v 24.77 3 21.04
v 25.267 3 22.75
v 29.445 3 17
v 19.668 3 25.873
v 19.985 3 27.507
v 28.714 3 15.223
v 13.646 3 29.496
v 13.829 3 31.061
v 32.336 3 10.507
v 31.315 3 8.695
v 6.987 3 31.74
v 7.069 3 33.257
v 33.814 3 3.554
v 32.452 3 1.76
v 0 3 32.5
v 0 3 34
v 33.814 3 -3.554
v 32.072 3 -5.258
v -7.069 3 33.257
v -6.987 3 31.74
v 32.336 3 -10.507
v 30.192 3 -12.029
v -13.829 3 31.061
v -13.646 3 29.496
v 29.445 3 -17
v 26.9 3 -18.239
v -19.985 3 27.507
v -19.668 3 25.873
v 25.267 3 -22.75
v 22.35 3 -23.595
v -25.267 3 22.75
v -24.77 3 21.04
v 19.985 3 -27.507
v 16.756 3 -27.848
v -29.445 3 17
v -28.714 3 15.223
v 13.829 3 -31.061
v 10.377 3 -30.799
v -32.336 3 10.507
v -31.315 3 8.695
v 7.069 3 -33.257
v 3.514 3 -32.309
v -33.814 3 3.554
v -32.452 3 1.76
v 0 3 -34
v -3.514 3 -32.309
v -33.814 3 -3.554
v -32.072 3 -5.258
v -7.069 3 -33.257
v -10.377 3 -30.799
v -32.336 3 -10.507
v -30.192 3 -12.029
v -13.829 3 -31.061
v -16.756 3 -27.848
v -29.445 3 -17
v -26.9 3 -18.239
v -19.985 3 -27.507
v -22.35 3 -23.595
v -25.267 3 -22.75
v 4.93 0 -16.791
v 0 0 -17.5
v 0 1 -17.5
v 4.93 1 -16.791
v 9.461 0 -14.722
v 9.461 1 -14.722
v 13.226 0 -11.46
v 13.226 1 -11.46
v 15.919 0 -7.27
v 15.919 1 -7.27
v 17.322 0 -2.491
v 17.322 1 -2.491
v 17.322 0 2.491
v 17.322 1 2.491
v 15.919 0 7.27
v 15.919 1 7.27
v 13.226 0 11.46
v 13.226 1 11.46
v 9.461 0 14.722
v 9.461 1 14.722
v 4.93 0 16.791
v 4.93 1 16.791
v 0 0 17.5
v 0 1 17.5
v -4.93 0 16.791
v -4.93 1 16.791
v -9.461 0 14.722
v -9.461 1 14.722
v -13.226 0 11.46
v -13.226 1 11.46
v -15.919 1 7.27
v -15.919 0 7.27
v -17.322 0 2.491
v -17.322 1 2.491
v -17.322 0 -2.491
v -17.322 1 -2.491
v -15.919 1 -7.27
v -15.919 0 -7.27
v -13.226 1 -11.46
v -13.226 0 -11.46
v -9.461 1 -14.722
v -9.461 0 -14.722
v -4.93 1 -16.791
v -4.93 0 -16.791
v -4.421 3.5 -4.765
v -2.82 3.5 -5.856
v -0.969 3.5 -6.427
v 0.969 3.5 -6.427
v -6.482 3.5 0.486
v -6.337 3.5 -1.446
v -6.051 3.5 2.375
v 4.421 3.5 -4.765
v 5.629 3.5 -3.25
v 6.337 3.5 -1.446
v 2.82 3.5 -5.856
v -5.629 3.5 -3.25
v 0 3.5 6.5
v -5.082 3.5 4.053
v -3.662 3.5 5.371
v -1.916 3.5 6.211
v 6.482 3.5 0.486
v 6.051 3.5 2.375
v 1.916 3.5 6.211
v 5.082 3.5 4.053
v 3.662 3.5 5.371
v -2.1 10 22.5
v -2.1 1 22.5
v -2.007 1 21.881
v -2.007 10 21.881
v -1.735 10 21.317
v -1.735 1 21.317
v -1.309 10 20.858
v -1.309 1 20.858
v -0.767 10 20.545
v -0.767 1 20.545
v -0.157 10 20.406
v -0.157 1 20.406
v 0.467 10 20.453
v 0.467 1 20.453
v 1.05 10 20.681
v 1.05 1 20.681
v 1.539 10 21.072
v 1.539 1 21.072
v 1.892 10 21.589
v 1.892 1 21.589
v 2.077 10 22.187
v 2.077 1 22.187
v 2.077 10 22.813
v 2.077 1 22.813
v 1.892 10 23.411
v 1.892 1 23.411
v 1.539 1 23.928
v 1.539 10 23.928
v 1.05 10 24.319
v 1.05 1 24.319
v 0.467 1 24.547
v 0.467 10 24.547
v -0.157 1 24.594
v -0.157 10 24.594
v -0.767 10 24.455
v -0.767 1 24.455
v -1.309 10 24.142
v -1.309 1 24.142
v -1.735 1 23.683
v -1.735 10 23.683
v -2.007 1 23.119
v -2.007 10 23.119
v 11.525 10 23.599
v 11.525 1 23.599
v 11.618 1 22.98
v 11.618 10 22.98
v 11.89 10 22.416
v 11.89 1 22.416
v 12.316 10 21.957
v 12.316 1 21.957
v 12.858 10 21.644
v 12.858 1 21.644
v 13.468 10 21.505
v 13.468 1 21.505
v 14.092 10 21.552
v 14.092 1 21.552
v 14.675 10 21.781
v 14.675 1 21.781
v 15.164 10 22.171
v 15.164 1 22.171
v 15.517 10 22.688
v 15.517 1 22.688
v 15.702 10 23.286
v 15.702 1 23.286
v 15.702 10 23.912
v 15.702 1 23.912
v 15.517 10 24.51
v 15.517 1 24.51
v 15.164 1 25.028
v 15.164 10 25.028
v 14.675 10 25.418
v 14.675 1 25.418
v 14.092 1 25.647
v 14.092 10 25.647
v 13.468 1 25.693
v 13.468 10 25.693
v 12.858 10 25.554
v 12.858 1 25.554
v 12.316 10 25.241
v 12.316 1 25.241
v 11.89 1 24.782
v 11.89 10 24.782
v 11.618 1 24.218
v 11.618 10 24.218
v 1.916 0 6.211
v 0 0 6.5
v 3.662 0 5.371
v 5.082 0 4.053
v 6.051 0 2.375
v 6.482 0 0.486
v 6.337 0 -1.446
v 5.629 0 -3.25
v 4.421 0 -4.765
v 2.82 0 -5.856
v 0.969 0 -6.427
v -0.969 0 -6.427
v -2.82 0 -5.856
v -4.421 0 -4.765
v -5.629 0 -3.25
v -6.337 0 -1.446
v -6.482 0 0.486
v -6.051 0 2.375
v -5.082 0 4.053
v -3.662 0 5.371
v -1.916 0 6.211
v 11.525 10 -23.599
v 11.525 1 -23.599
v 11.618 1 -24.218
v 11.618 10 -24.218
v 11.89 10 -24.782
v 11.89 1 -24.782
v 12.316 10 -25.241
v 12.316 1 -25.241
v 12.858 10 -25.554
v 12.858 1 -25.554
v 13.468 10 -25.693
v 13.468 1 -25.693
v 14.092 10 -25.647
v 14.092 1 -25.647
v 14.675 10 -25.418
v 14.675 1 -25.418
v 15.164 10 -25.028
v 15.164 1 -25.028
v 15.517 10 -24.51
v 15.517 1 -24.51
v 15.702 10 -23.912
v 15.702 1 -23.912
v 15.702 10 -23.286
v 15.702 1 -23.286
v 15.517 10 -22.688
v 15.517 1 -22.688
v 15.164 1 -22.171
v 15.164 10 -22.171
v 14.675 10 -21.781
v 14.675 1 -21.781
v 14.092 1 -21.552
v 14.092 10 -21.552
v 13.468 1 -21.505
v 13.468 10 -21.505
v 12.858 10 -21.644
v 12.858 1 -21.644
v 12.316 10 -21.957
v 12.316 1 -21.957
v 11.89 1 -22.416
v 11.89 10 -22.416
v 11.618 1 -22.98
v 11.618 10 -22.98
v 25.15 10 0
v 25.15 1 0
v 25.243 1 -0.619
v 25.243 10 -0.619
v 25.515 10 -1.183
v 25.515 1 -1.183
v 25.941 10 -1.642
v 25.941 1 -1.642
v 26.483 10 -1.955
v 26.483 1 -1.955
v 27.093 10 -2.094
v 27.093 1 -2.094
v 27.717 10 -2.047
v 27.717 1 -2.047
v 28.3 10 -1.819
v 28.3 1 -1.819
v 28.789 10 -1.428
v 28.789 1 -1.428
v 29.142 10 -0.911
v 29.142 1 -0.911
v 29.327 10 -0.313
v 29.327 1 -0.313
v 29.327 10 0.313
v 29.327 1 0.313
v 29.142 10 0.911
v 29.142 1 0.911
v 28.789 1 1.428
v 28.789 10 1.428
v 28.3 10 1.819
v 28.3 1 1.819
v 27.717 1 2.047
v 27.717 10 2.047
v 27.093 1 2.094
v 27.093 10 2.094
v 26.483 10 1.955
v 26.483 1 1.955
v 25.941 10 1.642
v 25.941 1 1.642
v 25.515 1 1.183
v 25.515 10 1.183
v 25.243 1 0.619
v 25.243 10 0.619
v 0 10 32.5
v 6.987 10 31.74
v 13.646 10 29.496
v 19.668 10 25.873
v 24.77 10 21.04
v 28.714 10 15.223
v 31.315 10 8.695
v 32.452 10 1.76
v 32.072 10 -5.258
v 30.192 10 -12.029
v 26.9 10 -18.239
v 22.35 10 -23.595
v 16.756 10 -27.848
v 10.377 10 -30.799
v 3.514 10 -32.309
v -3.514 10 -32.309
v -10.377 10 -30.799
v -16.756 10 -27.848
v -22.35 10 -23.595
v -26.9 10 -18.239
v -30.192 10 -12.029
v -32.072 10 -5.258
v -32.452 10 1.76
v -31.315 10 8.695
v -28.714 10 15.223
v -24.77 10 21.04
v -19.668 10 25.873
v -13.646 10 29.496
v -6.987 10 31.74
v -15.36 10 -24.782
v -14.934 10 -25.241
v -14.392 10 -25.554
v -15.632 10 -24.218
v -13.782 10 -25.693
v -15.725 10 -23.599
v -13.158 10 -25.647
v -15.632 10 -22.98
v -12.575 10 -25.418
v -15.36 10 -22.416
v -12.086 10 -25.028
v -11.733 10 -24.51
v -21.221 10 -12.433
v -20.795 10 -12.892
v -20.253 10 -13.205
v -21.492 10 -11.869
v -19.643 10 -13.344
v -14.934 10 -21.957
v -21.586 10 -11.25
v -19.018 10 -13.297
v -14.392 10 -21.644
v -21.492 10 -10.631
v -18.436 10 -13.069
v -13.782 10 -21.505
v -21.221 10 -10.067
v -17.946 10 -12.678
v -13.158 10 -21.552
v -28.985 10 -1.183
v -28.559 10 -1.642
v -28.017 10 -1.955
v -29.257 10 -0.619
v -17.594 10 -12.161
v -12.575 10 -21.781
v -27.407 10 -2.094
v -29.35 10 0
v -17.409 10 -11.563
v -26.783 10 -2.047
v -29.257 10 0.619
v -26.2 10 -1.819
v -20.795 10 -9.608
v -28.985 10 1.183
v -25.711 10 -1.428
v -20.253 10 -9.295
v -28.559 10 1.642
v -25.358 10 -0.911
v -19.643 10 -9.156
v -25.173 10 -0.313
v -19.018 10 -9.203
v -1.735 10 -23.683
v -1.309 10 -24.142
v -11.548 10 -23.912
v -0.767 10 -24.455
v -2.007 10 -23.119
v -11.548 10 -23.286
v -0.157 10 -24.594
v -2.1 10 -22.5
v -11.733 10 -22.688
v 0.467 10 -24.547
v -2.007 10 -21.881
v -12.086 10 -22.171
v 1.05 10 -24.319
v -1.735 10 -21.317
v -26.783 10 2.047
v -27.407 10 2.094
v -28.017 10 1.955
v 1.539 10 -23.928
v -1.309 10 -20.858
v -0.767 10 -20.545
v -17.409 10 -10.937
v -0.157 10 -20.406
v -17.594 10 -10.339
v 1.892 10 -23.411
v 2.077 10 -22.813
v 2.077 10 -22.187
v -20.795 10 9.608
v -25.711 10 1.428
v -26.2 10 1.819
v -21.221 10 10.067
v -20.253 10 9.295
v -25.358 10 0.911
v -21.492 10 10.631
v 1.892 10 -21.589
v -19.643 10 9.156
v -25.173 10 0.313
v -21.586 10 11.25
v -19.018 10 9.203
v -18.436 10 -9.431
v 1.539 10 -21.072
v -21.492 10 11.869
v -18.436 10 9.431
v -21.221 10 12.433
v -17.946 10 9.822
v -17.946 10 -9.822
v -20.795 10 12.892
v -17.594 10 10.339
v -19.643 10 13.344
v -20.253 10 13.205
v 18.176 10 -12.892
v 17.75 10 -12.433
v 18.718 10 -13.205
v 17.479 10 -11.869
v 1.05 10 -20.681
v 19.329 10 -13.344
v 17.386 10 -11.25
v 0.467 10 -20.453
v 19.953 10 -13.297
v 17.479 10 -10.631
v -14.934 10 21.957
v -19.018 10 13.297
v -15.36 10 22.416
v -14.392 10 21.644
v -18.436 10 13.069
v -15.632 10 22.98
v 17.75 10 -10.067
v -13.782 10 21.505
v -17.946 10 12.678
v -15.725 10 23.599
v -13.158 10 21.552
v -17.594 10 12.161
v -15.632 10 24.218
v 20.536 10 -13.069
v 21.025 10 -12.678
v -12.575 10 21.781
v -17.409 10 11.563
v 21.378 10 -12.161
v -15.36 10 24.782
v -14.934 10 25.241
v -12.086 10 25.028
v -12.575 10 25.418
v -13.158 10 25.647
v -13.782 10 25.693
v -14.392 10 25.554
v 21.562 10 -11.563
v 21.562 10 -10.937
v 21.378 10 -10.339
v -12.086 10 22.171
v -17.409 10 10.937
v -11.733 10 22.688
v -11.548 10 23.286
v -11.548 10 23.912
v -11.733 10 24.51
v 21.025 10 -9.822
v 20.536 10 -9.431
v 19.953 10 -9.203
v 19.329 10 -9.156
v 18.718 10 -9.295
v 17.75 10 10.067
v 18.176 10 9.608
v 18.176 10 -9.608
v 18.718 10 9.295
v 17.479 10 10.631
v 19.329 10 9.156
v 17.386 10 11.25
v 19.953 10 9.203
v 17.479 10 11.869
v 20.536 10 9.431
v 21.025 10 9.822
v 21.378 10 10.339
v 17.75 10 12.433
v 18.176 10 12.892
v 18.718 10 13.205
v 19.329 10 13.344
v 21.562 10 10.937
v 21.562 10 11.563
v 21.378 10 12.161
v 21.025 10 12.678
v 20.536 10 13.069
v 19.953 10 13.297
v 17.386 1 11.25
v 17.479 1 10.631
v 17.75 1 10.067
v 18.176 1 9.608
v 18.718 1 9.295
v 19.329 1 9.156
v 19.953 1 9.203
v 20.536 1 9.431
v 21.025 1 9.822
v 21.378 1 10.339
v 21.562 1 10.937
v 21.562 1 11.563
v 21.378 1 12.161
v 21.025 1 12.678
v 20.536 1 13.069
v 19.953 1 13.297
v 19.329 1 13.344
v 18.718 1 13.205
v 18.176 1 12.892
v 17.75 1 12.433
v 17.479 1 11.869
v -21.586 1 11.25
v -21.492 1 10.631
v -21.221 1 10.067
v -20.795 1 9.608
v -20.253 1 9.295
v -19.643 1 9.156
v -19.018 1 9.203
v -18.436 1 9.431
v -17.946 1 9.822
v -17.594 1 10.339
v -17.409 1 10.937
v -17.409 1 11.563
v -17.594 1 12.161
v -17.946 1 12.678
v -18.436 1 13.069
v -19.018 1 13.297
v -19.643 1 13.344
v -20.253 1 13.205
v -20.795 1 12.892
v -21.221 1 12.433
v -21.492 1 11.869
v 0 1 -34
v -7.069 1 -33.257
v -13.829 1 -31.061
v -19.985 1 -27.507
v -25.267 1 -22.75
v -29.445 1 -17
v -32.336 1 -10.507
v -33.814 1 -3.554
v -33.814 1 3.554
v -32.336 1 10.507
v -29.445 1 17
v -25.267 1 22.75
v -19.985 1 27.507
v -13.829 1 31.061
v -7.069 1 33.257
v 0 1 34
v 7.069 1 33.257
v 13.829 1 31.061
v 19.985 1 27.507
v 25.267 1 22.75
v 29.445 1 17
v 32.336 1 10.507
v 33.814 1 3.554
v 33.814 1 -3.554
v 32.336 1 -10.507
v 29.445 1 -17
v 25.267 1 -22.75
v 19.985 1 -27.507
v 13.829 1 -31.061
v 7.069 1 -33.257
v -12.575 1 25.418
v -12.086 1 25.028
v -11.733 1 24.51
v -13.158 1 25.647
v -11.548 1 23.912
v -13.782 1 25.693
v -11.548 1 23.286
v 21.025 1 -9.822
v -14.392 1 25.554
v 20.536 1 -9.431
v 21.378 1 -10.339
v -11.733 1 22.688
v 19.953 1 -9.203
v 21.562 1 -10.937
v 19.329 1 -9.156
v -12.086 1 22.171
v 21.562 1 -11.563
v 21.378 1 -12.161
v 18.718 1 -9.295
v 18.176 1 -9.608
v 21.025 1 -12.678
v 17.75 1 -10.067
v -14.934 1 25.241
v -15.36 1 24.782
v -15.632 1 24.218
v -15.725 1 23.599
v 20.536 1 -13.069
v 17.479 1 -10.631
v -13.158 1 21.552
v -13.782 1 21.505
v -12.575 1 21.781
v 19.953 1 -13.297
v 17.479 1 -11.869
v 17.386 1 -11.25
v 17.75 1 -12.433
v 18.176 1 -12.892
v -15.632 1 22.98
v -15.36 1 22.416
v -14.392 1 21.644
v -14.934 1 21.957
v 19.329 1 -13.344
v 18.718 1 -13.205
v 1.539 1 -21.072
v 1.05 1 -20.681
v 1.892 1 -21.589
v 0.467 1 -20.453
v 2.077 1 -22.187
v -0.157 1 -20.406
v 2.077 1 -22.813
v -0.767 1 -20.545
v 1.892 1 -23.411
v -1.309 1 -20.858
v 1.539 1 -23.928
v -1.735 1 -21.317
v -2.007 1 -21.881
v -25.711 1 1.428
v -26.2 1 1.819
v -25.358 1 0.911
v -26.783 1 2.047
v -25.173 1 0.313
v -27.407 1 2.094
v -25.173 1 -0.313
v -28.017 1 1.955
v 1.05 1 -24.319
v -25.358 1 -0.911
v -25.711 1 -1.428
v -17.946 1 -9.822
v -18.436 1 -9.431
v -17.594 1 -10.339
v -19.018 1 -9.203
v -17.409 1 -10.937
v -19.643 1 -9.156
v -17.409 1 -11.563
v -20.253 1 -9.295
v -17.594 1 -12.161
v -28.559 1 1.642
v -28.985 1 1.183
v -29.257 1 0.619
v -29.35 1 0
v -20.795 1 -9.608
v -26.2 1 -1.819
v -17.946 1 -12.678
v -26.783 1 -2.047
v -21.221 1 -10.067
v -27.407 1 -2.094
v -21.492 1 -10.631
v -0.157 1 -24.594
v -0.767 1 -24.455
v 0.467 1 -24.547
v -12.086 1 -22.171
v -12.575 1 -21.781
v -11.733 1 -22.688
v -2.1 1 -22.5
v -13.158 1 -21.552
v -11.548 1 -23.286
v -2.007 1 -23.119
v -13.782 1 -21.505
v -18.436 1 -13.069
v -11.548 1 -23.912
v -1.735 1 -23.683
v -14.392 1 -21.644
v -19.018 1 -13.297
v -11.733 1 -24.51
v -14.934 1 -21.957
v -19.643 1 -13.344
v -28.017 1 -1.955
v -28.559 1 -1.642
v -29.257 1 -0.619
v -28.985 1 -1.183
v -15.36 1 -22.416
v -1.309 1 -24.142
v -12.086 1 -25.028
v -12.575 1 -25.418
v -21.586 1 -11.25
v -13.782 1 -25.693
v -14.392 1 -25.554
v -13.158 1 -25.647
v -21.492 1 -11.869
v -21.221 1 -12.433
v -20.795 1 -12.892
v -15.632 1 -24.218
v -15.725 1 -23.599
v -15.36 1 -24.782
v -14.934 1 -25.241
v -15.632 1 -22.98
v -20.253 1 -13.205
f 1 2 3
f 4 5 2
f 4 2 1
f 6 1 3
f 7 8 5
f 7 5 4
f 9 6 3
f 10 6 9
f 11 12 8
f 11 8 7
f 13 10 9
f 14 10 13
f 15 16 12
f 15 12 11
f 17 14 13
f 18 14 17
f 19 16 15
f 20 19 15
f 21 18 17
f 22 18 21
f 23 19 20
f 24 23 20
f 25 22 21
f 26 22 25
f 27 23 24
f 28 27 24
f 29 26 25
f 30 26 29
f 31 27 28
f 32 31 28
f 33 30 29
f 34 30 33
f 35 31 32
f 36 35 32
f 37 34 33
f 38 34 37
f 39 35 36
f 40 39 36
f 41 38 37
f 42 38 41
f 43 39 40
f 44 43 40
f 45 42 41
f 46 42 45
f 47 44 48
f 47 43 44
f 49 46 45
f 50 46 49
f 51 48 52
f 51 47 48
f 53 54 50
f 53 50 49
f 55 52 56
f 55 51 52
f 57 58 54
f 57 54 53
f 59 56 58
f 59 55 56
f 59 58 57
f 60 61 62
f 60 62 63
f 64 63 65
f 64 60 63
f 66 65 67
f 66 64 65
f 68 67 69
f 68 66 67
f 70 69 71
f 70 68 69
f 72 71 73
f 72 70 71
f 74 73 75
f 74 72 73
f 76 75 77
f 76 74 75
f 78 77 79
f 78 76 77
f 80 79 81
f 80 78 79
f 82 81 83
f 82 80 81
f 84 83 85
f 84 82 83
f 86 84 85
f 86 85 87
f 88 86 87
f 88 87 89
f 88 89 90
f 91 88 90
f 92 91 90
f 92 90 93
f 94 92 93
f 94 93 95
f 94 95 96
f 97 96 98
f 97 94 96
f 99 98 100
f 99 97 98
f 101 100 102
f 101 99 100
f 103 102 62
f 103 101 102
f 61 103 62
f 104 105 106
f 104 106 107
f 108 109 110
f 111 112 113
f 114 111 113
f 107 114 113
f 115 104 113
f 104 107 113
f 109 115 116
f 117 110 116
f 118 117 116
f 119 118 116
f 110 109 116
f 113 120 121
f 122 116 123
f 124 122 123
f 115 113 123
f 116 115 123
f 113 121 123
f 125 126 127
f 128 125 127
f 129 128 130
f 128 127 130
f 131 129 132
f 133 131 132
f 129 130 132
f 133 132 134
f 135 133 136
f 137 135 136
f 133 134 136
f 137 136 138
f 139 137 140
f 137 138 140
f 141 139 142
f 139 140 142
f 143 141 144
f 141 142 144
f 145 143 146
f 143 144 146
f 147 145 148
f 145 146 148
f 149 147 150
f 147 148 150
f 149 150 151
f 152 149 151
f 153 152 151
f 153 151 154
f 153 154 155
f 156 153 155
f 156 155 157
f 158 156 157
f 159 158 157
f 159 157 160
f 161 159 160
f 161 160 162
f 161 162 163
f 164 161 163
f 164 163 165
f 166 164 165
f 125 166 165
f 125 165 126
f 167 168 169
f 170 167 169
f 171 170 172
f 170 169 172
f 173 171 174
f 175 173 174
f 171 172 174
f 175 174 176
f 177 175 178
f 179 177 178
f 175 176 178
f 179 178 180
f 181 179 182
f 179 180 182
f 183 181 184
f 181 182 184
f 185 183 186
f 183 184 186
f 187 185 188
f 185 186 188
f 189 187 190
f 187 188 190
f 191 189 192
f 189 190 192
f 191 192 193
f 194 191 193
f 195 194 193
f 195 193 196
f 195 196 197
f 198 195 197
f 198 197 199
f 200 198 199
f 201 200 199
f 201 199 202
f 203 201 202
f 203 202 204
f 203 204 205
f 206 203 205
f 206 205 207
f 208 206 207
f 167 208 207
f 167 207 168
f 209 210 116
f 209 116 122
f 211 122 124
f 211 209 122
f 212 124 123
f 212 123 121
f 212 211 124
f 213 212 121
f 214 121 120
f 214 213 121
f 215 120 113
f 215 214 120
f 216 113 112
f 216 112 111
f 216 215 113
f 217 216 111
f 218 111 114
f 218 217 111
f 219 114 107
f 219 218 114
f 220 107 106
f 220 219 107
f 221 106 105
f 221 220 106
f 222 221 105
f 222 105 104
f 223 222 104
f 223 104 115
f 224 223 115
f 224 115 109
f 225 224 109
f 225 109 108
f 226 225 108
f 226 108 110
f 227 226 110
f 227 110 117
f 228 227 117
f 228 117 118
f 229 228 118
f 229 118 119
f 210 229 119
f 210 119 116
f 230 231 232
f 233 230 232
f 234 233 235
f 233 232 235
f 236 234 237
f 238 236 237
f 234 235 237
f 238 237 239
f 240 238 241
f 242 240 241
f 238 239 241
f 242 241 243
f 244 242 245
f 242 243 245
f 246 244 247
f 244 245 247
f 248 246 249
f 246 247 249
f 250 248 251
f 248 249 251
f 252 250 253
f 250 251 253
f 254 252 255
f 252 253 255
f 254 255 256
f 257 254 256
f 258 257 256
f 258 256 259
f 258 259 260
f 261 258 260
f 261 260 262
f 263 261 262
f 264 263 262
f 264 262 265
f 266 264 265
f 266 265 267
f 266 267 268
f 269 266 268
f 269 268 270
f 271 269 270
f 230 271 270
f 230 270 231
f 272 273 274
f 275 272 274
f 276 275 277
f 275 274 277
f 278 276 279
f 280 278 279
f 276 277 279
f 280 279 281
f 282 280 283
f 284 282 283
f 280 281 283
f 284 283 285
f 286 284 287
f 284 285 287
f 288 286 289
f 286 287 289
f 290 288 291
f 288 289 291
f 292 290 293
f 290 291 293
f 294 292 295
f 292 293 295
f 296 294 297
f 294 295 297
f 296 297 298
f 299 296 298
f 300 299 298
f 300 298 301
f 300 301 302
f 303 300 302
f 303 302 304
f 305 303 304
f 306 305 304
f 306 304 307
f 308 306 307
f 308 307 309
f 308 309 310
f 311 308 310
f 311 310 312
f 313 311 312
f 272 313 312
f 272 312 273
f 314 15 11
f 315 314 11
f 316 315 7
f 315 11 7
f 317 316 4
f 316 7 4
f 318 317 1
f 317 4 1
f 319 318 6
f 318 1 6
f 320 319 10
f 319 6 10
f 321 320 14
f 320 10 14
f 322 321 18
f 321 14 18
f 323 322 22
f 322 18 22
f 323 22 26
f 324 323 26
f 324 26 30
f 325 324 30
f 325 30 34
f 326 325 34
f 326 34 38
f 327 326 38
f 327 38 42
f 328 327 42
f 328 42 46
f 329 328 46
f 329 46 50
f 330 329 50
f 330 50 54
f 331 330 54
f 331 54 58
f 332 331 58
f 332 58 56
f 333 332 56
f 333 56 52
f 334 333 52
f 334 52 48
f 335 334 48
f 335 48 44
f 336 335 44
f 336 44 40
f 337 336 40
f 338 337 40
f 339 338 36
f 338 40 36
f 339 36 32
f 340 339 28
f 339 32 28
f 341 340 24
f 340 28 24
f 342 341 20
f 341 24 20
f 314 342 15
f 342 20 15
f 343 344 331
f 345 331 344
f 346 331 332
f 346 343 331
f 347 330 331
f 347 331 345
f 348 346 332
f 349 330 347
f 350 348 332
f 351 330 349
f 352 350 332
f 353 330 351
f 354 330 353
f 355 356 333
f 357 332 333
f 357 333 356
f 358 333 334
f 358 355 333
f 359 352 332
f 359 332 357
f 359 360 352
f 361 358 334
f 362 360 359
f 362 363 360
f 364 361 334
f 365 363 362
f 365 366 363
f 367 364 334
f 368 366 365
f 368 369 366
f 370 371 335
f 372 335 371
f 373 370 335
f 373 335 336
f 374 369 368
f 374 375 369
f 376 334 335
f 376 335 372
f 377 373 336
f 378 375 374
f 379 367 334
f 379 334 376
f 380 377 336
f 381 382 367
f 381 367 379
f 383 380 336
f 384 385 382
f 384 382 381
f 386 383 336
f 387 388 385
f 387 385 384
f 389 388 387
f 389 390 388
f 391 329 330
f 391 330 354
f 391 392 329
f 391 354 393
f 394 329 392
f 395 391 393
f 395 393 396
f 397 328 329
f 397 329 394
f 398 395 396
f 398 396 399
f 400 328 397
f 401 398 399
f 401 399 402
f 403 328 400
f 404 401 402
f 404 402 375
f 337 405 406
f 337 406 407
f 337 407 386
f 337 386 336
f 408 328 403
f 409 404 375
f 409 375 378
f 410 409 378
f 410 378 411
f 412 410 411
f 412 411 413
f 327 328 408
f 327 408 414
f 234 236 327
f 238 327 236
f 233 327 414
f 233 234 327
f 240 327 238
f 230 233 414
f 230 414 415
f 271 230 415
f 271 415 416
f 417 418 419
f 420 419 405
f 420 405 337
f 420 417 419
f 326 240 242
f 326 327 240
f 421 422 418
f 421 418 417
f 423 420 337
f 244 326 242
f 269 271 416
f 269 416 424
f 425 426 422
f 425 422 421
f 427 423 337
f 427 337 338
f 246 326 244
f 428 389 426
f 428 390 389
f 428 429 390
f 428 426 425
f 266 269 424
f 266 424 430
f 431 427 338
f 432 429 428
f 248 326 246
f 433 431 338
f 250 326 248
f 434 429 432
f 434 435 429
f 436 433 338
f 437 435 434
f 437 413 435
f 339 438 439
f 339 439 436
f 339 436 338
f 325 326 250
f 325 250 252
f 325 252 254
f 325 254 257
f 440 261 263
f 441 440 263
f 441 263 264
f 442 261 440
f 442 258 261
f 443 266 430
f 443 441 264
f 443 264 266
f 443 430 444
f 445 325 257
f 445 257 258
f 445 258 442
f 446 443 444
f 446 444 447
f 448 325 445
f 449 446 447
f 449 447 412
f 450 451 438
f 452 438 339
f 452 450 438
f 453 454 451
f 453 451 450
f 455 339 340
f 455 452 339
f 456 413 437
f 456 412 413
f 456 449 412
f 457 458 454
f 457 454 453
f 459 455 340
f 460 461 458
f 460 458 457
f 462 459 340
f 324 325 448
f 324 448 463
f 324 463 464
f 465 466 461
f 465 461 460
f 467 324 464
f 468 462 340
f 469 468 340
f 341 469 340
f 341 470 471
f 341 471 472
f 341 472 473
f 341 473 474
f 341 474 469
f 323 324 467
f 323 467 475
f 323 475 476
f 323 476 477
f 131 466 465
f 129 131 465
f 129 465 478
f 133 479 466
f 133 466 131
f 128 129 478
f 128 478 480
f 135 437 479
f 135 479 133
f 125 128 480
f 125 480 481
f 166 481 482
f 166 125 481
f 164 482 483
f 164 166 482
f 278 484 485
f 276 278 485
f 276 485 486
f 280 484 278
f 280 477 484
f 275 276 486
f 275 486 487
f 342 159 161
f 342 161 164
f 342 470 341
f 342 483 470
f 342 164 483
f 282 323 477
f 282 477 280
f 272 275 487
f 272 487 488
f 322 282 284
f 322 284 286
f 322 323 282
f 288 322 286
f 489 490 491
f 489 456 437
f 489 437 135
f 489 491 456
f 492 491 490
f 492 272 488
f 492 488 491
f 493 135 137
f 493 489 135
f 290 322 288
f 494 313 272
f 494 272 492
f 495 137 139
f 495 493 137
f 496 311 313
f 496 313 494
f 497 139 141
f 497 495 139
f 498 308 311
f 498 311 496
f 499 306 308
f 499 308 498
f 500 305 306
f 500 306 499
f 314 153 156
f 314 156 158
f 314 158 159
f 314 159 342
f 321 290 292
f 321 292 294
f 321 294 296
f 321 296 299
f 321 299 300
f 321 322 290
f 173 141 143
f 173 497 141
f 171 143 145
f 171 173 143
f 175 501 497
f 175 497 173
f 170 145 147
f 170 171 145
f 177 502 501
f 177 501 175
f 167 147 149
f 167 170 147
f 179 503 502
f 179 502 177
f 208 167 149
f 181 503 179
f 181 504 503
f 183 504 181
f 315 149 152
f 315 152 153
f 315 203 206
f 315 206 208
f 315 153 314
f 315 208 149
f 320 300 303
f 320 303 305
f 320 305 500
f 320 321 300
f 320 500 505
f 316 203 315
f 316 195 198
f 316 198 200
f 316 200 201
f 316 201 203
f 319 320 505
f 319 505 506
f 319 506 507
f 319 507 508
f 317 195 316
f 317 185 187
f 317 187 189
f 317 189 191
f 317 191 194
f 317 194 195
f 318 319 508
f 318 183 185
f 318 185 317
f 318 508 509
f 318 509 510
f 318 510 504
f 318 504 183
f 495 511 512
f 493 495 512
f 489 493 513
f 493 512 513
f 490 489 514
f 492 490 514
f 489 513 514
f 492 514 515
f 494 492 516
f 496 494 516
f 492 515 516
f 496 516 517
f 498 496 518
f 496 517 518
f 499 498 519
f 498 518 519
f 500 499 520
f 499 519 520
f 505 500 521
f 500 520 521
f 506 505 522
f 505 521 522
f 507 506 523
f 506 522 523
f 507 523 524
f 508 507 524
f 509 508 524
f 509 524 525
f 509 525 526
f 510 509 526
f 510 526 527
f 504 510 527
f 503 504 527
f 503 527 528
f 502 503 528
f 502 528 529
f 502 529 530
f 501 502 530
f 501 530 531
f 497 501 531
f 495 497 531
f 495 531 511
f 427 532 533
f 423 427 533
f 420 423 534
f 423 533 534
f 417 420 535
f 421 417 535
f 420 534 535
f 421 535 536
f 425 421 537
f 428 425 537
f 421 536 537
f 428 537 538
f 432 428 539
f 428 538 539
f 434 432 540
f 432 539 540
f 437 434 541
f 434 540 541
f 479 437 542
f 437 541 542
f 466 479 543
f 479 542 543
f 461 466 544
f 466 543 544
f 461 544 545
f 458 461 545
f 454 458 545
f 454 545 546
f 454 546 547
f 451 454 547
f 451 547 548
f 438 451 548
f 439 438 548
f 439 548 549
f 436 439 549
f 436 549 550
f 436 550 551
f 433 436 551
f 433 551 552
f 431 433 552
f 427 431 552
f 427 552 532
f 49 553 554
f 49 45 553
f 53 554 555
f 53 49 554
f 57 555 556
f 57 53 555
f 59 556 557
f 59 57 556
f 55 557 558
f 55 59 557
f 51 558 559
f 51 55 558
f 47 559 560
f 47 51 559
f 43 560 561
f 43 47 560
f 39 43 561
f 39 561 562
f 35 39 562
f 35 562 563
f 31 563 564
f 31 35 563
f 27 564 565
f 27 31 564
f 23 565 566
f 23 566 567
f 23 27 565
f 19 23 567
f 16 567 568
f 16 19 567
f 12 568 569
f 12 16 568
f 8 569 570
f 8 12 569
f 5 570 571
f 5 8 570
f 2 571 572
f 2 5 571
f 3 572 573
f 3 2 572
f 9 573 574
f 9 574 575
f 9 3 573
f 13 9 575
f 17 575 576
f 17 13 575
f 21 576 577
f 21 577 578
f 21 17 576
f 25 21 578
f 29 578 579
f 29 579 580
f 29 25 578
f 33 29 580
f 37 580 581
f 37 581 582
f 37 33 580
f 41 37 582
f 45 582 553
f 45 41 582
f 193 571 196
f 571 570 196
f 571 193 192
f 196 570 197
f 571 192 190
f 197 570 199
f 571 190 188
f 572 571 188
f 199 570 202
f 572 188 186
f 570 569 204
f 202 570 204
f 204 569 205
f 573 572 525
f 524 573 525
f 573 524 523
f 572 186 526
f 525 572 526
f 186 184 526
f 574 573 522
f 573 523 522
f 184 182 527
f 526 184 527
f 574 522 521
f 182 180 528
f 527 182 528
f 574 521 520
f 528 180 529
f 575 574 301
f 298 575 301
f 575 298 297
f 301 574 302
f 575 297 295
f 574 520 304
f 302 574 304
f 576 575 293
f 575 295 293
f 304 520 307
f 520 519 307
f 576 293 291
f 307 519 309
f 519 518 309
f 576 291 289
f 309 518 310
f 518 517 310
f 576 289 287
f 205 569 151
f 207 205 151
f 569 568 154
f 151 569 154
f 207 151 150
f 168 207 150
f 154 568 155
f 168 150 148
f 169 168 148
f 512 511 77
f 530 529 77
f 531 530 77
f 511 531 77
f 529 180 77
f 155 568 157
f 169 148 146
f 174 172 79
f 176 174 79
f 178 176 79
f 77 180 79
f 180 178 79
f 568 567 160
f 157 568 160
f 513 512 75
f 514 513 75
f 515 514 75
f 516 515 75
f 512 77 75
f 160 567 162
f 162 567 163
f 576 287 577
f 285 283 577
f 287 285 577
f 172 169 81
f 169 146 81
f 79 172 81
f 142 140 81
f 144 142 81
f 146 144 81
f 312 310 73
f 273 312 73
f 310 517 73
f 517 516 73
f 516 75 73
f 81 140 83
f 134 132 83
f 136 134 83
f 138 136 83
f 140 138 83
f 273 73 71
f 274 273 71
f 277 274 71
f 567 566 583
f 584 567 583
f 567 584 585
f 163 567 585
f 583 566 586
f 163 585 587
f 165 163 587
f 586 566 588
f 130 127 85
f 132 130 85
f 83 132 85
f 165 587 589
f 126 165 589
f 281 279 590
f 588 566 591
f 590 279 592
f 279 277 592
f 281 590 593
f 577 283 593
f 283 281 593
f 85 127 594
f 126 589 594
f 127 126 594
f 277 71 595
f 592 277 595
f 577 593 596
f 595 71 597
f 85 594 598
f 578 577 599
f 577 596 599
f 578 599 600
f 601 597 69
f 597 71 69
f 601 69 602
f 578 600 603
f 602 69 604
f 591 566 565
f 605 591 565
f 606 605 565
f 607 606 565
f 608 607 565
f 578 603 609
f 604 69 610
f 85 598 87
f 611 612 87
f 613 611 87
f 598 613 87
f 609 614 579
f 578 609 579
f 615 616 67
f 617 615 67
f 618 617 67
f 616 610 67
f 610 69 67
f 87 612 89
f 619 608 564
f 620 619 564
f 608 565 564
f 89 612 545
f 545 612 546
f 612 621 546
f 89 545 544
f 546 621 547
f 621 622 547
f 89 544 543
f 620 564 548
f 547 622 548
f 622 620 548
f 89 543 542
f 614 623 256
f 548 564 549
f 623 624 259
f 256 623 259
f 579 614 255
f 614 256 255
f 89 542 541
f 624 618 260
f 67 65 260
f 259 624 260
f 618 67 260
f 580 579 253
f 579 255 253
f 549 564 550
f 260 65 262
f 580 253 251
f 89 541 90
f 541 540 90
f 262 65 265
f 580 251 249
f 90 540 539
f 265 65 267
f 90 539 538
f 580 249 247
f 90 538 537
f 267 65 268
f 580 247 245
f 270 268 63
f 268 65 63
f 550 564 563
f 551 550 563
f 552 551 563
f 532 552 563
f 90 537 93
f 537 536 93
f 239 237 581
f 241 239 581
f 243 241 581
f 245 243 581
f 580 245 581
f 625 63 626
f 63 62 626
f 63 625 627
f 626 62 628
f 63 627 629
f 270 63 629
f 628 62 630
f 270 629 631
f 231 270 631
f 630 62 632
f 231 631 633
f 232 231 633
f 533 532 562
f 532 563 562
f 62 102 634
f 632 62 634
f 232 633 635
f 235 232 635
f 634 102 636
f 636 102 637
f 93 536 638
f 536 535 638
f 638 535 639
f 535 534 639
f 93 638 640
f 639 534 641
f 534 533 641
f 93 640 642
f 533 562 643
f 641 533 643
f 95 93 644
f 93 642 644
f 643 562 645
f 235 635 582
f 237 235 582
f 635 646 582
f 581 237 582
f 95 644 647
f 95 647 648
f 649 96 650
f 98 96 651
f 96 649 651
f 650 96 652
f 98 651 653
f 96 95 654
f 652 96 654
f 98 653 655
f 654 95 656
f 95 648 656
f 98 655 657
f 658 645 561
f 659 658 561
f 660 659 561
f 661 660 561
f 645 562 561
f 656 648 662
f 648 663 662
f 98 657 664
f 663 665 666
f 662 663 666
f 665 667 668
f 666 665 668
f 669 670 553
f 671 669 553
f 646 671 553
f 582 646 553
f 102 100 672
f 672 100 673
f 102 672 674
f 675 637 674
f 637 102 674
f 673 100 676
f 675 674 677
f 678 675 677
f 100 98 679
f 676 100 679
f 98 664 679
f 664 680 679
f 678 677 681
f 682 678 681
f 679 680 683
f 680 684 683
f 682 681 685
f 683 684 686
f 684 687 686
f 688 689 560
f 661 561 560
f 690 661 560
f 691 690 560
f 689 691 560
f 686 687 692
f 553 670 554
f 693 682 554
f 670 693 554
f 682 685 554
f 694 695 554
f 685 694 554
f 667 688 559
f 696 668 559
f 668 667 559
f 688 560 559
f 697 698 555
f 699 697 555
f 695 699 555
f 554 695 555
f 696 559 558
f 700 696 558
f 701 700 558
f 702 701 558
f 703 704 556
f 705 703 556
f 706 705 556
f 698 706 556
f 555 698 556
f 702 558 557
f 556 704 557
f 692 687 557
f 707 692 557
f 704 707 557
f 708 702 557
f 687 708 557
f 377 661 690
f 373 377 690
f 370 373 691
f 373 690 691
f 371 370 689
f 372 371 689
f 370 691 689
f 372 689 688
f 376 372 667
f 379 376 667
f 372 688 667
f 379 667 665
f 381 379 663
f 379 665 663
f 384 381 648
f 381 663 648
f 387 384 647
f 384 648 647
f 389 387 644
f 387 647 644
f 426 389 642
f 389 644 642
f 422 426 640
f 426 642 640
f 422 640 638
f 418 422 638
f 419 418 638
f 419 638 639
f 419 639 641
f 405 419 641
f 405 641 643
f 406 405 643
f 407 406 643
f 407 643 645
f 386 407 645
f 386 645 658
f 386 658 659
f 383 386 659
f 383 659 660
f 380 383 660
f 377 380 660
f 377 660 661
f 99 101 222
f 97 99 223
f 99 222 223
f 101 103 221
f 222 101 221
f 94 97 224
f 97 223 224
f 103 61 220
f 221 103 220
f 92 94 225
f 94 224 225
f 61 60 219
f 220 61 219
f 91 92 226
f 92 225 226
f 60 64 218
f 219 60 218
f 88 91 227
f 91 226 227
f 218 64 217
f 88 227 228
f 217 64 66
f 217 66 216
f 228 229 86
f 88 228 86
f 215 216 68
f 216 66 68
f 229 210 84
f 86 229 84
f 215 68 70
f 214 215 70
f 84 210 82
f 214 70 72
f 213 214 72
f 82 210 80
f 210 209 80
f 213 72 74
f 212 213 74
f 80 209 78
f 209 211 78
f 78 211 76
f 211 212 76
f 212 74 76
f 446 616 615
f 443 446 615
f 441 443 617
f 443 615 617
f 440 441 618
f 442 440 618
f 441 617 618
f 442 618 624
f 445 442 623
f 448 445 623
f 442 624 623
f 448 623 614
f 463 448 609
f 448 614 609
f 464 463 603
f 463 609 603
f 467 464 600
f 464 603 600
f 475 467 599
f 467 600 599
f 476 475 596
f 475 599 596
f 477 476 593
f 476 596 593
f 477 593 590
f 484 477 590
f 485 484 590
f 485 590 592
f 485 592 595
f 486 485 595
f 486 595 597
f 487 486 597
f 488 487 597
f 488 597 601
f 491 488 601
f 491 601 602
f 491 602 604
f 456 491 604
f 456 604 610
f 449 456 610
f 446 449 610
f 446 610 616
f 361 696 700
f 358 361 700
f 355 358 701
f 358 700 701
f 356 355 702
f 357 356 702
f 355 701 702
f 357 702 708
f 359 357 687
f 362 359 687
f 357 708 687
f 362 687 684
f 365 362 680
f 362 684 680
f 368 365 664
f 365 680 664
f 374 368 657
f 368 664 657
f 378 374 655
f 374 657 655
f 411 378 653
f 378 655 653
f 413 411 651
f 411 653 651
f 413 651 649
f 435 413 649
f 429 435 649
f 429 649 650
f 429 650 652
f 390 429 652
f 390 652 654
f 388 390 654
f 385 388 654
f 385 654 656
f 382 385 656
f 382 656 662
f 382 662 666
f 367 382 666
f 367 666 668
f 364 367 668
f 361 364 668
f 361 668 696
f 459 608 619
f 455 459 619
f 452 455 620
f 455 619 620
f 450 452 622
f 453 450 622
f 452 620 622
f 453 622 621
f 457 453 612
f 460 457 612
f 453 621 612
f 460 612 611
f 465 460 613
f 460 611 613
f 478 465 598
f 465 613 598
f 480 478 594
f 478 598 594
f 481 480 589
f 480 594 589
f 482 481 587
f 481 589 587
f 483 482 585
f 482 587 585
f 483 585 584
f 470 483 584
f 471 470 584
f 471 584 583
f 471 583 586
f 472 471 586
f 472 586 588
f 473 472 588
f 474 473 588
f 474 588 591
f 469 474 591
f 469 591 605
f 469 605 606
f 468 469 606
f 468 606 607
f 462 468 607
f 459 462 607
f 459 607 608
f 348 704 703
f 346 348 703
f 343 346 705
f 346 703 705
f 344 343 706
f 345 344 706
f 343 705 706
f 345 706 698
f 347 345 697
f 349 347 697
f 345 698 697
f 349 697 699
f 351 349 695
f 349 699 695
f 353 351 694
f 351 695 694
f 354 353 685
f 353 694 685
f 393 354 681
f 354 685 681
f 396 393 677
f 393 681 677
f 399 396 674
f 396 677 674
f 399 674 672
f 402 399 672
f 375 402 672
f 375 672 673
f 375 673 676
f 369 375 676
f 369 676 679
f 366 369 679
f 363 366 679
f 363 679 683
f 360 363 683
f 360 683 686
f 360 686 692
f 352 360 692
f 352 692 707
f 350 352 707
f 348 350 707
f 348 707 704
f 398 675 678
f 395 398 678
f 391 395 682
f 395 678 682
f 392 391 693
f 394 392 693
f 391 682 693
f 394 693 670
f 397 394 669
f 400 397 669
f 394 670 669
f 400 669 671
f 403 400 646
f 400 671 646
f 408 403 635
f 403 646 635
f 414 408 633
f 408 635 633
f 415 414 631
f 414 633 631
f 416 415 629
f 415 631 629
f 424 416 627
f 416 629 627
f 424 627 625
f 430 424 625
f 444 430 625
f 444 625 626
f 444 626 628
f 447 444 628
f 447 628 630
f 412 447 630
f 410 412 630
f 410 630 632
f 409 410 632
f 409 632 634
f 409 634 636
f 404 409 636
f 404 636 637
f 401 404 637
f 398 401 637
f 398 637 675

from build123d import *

# Parameters (mm, degrees)
SKETCH2_R             = 32.5
SKETCH2_R_2           = 6.5
SKETCH2_R_3           = 1.5
BOSS_EXTRUDE1_DEPTH   = 10
M5X0_8_TAPPED_HOLE1_D = 4.2
BOSS_EXTRUDE2_START   = -6.5
SKETCH8_R             = 6.5
BOSS_EXTRUDE2_DEPTH   = 6.5
SKETCH9_R             = 32.5
SKETCH9_R_2           = 17.5
CUT_EXTRUDE1_DEPTH    = 1
SKETCH10_W            = 1.5
SKETCH10_H            = 2
M5X0_8_TAPPED_HOLE2_D = 4.2


with BuildPart() as part:
    # Sketch2 → Boss-Extrude1 (new body)
    with BuildSketch(Plane(origin=(0, 0, 0), x_dir=(1, 0, 0), z_dir=(0, 1, 0))):
        with Locations(Location((0, 0, 0), (0, 0, 270))):
            Circle(SKETCH2_R)
        with Locations(Location((0, 0, 0), (0, 0, 270))):
            Circle(SKETCH2_R_2, mode=Mode.SUBTRACT)
        with Locations(Location((27.25, 0, 0), (0, 0, 270))):
            Circle(SKETCH2_R_3, mode=Mode.SUBTRACT)
        with Locations(Location((13.625, -23.599192253, 0), (0, 0, 270))):
            Circle(SKETCH2_R_3, mode=Mode.SUBTRACT)
        with Locations(Location((-13.625, -23.599192253, 0), (0, 0, 270))):
            Circle(SKETCH2_R_3, mode=Mode.SUBTRACT)
        with Locations(Location((-27.25, 0, 0), (0, 0, 270))):
            Circle(SKETCH2_R_3, mode=Mode.SUBTRACT)
        with Locations(Location((-13.625, 23.599192253, 0), (0, 0, 270))):
            Circle(SKETCH2_R_3, mode=Mode.SUBTRACT)
        with Locations(Location((13.625, 23.599192253, 0), (0, 0, 270))):
            Circle(SKETCH2_R_3, mode=Mode.SUBTRACT)
    extrude(amount=BOSS_EXTRUDE1_DEPTH)

    # M5x0.8 Tapped Hole1 (through all)
    with Locations(Plane(origin=(0, 10, 0), x_dir=(1, 0, 0), z_dir=(0, 1, 0))):
        with Locations((-13.625, 23.599192253), (13.625, 23.599192253), (27.25, 0), (13.625, -23.599192253), (-13.625, -23.599192253), (-27.25, 0)):
            Hole(M5X0_8_TAPPED_HOLE1_D / 2)

    # Sketch8 → Boss-Extrude2 (add)
    with BuildSketch(Plane(origin=(0, 10, 0), x_dir=(1, 0, 0), z_dir=(0, 1, 0)).offset(BOSS_EXTRUDE2_START)):
        with Locations(Location((0, 0, 0), (0, 0, 270))):
            Circle(SKETCH8_R)
    extrude(amount=BOSS_EXTRUDE2_DEPTH)

    # Sketch9 → Cut-Extrude1 (cut)
    with BuildSketch(Plane.XZ):
        with Locations(Location((0, 0, 0), (0, 0, 270))):
            Circle(SKETCH9_R)
        with Locations(Location((0, 0, 0), (0, 0, 270))):
            Circle(SKETCH9_R_2, mode=Mode.SUBTRACT)
    extrude(amount=-CUT_EXTRUDE1_DEPTH, mode=Mode.SUBTRACT)

    # Sketch10 → Revolve1 (revolve)
    with BuildSketch(Plane(origin=(0, 0, 0), x_dir=(0, 0, -1), z_dir=(1, 0, 0)), mode=Mode.PRIVATE) as revolve1_sk:
        with Locations((-33.25, 2)):
            Rectangle(SKETCH10_W, SKETCH10_H)
    revolve(revolve1_sk.sketch.rotate(Axis((0, 0, 0), (0, 1, 0)), 180), axis=Axis((0, 0, 0), (0, 1, 0)))

    # M5x0.8 Tapped Hole2 (through all)
    with Locations(Plane(origin=(0, 10, 0), x_dir=(1, 0, 0), z_dir=(0, 1, 0))):
        with Locations((0, 22.5), (19.485571585, 11.25), (19.485571585, -11.25), (0, -22.5), (-19.485571585, -11.25), (-19.485571585, 11.25)):
            Hole(M5X0_8_TAPPED_HOLE2_D / 2)


solid = part.part
